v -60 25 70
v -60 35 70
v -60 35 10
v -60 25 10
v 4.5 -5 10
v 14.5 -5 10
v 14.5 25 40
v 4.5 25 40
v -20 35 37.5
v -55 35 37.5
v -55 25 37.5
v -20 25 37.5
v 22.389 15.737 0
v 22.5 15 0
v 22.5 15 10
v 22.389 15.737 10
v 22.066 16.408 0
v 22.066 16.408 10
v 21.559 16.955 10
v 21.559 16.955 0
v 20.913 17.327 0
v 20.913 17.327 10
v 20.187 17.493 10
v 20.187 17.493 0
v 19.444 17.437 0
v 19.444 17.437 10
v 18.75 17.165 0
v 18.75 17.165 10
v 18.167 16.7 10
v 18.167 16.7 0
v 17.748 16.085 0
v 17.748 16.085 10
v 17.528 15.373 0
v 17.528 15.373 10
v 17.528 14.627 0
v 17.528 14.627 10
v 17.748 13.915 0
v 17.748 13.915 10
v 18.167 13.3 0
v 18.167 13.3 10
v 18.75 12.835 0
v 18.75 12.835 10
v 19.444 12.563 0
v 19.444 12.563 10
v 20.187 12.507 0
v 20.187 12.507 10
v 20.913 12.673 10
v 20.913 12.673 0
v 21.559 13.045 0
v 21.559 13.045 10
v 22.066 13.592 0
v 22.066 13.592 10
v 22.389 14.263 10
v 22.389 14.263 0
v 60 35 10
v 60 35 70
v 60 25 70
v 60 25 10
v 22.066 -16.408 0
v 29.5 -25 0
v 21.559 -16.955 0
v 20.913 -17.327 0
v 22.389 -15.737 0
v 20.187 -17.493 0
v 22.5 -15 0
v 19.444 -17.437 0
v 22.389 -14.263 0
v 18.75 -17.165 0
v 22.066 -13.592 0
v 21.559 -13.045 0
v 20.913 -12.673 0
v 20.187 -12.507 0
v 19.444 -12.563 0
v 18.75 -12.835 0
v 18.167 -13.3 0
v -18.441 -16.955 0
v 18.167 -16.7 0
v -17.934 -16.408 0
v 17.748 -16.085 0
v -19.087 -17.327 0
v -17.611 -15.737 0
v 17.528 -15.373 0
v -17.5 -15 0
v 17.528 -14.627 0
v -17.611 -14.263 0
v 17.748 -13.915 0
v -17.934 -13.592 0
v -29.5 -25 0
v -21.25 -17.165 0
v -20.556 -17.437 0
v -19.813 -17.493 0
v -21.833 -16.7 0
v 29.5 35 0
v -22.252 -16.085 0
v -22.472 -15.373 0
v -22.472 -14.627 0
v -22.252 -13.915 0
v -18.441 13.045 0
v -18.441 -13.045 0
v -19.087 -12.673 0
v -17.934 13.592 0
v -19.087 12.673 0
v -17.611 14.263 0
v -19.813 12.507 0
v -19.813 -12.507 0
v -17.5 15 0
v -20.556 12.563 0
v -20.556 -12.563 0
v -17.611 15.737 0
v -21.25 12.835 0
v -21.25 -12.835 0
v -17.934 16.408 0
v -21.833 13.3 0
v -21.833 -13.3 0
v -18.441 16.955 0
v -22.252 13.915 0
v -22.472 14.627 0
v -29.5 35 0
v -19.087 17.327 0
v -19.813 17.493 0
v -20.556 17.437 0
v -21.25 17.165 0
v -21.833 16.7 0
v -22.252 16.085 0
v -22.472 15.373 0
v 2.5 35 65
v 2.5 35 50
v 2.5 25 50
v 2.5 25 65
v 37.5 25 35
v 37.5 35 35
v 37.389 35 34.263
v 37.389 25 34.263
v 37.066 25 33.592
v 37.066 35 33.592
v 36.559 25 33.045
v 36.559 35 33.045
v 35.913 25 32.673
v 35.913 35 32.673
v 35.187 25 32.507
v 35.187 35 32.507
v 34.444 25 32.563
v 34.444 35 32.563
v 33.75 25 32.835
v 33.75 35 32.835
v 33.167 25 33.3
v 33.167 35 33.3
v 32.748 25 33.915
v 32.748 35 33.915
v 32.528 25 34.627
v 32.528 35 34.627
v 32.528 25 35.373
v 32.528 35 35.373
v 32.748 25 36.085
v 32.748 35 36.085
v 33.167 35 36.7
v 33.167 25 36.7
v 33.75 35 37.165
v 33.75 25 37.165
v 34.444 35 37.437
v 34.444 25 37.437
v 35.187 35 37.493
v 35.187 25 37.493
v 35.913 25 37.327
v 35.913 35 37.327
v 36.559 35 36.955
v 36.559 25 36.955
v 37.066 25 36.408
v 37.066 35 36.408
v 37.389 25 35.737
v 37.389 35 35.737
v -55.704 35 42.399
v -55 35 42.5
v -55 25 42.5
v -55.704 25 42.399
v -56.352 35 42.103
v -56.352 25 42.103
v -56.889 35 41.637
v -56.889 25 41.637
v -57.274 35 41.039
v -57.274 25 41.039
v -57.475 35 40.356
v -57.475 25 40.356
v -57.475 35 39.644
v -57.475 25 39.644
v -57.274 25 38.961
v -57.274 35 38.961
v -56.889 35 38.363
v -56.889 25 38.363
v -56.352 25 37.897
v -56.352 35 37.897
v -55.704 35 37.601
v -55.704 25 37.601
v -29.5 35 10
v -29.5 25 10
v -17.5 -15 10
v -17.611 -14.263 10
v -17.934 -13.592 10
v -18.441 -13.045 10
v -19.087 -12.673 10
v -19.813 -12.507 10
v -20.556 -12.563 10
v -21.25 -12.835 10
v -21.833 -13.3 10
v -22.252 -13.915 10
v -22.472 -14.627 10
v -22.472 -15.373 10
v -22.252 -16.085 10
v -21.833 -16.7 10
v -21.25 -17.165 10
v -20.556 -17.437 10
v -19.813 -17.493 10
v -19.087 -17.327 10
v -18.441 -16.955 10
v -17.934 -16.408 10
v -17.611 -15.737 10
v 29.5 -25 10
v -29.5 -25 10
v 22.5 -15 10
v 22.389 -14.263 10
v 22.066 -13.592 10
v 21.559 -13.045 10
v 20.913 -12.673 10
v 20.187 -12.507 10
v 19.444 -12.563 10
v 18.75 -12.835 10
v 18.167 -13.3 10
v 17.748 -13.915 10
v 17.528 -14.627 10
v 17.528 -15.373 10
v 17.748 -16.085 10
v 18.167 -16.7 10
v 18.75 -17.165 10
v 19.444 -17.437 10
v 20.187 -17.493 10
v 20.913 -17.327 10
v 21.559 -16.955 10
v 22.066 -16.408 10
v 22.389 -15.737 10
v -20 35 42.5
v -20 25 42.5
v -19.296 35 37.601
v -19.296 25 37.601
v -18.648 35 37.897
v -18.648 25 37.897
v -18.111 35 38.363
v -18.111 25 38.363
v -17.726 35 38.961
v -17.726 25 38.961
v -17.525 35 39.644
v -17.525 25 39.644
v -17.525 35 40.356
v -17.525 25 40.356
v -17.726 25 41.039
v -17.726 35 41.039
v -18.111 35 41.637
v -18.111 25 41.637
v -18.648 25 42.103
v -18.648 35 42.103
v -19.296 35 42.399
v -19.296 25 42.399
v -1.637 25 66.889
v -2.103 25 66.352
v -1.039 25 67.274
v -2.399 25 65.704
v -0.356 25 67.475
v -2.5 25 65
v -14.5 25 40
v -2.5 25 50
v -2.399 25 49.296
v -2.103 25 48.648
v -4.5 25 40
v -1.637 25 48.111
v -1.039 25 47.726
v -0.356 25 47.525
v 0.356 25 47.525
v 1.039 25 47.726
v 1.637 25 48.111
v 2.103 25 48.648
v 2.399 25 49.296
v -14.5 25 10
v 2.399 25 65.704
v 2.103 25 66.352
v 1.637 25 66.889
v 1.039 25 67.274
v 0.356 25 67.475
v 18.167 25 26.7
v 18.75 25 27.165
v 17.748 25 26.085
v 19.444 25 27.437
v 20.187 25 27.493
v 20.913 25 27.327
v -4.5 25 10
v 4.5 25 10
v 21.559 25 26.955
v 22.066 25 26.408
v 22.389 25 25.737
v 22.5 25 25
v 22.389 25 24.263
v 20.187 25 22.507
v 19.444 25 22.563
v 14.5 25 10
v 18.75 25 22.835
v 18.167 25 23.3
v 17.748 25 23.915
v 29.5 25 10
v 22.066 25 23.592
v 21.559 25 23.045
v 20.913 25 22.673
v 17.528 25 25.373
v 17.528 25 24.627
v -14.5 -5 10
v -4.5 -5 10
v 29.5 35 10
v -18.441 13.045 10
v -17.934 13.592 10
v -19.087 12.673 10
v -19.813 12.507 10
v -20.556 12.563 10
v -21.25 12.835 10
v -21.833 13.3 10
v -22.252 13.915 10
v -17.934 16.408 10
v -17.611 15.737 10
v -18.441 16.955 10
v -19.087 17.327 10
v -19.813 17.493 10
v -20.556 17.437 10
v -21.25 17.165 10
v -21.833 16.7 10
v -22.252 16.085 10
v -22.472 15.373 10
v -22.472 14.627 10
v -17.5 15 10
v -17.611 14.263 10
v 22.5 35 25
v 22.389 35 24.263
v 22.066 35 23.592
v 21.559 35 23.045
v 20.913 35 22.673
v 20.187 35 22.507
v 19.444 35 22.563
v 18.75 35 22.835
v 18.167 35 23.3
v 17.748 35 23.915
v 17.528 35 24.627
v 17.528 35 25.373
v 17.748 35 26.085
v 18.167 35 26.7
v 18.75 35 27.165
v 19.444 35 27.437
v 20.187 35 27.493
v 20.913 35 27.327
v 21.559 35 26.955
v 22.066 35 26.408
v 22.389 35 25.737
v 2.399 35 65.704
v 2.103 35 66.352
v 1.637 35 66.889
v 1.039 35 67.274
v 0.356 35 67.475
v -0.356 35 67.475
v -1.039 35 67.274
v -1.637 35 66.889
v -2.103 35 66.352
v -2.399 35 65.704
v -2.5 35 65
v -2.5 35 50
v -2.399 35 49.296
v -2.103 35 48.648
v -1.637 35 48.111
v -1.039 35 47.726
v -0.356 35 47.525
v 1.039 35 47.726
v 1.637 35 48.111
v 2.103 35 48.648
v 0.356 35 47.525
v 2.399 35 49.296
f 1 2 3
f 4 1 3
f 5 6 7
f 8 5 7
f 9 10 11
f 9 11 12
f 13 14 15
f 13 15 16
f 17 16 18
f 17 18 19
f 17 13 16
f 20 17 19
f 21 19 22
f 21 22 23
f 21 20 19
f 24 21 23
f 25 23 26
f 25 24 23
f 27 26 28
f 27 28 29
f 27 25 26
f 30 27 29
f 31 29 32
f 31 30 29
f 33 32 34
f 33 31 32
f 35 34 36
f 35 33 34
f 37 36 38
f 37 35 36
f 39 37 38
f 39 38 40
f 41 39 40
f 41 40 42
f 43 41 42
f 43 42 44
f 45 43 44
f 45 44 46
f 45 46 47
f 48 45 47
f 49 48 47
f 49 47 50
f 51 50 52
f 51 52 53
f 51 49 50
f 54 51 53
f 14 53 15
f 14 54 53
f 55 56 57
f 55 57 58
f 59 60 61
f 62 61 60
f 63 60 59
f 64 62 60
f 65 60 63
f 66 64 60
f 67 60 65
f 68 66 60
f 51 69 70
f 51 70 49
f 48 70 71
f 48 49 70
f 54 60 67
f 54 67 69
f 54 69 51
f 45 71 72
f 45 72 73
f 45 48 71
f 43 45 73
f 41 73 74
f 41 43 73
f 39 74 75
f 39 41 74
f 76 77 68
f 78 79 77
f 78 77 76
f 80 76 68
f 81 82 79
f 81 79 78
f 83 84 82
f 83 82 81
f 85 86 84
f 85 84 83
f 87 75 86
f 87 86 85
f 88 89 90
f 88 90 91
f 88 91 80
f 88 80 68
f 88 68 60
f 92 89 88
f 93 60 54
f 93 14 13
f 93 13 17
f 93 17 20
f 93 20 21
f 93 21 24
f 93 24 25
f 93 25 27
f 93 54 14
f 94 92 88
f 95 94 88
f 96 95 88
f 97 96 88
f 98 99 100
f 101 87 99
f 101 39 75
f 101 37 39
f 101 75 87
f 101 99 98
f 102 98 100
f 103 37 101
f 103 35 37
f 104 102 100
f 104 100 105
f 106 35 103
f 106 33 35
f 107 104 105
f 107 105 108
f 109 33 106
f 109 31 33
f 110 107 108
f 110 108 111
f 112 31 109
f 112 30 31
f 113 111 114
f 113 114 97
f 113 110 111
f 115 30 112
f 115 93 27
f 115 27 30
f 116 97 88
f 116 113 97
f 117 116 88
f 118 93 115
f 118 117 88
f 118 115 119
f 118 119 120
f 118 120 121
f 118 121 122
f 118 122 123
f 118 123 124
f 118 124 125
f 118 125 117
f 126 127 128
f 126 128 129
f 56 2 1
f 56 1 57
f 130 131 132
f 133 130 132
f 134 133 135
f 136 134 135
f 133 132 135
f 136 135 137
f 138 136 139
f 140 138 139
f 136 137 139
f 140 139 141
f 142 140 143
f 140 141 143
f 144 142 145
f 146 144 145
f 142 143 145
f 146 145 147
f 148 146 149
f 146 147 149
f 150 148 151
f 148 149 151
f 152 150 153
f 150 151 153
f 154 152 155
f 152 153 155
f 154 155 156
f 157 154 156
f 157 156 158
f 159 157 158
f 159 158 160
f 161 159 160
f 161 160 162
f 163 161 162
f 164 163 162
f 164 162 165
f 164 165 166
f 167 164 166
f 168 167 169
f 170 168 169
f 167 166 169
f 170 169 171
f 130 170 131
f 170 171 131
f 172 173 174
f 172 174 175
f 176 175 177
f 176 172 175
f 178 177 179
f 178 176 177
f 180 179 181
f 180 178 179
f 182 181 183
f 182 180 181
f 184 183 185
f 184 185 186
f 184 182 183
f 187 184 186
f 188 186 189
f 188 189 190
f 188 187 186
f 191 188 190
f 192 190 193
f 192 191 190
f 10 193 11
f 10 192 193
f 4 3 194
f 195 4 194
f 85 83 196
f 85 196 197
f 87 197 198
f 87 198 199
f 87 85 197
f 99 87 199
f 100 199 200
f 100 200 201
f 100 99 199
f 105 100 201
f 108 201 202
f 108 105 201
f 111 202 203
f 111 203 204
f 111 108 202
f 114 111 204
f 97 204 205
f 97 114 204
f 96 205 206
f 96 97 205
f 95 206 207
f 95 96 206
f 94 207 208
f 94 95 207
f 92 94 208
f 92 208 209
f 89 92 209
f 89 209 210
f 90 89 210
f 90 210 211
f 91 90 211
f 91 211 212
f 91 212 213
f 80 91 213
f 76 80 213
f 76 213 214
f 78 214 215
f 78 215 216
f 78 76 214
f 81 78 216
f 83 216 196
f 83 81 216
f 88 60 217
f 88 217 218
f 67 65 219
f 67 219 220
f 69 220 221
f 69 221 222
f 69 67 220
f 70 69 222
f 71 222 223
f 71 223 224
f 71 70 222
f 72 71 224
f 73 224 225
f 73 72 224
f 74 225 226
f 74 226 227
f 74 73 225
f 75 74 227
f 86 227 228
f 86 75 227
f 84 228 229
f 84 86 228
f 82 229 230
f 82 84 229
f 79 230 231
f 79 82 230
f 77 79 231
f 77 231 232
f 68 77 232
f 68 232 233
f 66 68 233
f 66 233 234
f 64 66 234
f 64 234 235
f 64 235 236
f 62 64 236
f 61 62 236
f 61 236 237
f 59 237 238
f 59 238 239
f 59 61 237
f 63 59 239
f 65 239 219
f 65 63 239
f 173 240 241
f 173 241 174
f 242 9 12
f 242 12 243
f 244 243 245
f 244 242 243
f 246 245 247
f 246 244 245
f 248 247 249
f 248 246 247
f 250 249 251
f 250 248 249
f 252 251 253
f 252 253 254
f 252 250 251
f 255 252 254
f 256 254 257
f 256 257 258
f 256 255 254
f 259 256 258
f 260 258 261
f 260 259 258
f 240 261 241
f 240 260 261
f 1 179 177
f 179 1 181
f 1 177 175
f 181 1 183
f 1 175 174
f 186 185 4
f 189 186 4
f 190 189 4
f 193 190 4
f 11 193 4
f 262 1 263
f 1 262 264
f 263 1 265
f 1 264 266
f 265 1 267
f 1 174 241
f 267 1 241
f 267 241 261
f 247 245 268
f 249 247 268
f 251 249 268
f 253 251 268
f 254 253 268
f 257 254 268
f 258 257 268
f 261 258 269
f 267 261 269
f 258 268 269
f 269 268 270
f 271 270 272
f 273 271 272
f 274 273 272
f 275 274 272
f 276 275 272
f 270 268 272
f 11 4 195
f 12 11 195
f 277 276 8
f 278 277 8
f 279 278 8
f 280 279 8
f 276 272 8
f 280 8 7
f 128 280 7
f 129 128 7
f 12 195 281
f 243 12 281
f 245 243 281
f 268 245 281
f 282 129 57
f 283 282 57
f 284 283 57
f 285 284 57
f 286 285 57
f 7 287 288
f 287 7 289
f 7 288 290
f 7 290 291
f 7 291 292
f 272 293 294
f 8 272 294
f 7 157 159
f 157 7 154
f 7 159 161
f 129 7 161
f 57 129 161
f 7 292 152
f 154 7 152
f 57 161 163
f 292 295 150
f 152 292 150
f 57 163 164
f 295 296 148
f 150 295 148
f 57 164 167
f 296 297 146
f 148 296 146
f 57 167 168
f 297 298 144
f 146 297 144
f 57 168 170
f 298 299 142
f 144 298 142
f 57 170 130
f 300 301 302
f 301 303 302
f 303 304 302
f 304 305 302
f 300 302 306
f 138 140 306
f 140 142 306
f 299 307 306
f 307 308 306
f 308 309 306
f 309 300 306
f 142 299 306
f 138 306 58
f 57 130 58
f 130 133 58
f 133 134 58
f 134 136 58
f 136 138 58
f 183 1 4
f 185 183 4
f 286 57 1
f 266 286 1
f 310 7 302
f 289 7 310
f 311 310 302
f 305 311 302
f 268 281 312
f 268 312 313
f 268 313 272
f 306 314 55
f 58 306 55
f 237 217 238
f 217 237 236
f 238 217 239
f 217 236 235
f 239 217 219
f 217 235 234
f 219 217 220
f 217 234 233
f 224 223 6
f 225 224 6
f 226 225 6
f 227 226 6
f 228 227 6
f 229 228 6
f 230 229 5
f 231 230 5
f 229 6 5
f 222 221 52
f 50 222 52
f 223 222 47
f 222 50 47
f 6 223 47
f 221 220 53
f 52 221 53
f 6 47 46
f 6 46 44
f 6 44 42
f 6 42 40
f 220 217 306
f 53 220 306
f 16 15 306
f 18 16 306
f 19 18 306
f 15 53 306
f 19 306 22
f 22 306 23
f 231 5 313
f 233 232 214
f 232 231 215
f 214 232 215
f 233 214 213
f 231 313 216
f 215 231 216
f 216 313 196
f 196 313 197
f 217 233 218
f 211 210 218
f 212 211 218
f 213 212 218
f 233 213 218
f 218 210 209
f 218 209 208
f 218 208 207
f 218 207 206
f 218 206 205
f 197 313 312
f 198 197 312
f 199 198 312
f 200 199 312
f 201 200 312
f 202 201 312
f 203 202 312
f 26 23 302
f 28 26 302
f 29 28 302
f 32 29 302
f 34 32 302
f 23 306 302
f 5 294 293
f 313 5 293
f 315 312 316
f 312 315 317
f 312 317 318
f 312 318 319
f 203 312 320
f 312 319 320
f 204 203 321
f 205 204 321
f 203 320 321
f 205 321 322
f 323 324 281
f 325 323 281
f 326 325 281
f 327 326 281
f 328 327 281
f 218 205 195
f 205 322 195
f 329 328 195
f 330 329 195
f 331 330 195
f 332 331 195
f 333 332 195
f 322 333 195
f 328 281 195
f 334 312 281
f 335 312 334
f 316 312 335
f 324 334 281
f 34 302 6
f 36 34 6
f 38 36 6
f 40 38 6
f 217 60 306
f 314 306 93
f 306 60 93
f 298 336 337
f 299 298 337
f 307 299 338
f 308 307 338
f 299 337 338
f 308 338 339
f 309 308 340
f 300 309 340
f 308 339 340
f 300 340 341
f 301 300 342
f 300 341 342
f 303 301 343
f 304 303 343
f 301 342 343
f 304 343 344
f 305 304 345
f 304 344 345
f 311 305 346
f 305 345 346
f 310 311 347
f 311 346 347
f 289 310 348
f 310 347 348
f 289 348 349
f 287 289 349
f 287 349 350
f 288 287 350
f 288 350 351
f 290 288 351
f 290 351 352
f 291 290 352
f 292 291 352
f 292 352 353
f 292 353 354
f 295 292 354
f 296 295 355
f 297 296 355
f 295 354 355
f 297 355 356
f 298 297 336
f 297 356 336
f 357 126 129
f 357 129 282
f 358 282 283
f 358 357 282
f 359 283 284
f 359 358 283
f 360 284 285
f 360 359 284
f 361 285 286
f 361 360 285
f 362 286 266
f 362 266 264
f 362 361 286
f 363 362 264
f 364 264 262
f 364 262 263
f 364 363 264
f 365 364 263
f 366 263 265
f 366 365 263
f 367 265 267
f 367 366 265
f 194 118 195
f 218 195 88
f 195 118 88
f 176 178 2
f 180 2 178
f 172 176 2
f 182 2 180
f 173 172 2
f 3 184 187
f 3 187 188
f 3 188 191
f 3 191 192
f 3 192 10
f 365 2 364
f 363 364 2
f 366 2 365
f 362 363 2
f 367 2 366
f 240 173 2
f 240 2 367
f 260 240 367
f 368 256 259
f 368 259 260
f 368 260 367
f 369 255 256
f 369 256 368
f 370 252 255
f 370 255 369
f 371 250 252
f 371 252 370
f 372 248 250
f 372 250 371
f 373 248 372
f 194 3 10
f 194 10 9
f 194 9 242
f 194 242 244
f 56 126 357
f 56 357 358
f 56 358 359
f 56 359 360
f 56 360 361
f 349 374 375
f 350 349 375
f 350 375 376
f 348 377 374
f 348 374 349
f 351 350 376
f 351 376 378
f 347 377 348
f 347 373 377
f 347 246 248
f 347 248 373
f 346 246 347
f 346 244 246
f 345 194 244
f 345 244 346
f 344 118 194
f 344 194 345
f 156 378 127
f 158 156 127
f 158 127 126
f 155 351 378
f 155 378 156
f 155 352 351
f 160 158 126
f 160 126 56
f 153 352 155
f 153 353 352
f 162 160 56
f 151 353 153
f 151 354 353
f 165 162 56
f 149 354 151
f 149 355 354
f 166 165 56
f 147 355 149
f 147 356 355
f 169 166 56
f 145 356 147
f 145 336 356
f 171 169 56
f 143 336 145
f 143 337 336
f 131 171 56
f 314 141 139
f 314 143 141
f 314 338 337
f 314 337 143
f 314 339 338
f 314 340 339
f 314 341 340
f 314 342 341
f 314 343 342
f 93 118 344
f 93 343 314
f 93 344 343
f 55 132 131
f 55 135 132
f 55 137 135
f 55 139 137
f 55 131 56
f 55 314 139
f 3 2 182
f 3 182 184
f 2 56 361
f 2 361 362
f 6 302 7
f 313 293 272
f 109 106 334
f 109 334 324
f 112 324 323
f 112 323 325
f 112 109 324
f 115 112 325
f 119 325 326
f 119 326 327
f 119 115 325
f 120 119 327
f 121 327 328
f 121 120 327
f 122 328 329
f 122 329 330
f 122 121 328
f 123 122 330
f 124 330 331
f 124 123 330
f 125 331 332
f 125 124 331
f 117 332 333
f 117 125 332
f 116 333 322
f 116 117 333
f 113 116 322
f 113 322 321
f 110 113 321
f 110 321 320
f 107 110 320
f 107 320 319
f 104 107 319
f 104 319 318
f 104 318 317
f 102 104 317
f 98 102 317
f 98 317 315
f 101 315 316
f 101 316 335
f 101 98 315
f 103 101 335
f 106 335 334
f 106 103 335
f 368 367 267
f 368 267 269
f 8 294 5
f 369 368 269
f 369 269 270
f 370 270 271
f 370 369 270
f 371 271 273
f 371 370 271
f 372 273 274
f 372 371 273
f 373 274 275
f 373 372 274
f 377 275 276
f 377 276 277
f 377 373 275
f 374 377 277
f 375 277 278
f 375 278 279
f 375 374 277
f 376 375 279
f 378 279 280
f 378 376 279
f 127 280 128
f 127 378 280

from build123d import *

# Parameters (mm, degrees)
SKETCH1_R           = 2.5
BOSS_EXTRUDE1_DEPTH = 10
SKETCH2_W           = 120
SKETCH2_H           = 60
SKETCH2_R           = 2.5
BOSS_EXTRUDE2_DEPTH = 10
BOSS_EXTRUDE3_DEPTH = 10


with BuildPart() as part:
    # Sketch1 → Boss-Extrude1 (new body)
    with BuildSketch(Plane.XY):
        Polygon((-29.5, 25), (-29.5, 35), (29.5, 35), (29.5, 25), (29.5, -25), (-29.5, -25), align=None)
        with Locations((-20, 15)):
            Circle(SKETCH1_R, mode=Mode.SUBTRACT)
        with Locations((20, 15)):
            Circle(SKETCH1_R, mode=Mode.SUBTRACT)
        with Locations((20, -15)):
            Circle(SKETCH1_R, mode=Mode.SUBTRACT)
        with Locations((-20, -15)):
            Circle(SKETCH1_R, mode=Mode.SUBTRACT)
    extrude(amount=BOSS_EXTRUDE1_DEPTH)

    # Sketch2 → Boss-Extrude2 (add)
    with BuildSketch(Plane(origin=(0, 35, 0), x_dir=(1, 0, 0), z_dir=(0, 1, 0))):
        with Locations((0, -40)):
            Rectangle(SKETCH2_W, SKETCH2_H)
        with Locations((20, -25)):
            Circle(SKETCH2_R, mode=Mode.SUBTRACT)
        with Locations((35, -35)):
            Circle(SKETCH2_R, mode=Mode.SUBTRACT)
        with BuildLine():
            Line((-55, -37.5), (-20, -37.5))
            ThreePointArc((-20, -37.5), (-17.5, -40), (-20, -42.5))
            Line((-20, -42.5), (-55, -42.5))
            ThreePointArc((-55, -42.5), (-57.5, -40), (-55, -37.5))
        make_face(mode=Mode.SUBTRACT)
        with BuildLine():
            Line((-2.5, -65), (-2.5, -50))
            ThreePointArc((-2.5, -50), (0, -47.5), (2.5, -50))
            Line((2.5, -50), (2.5, -65))
            ThreePointArc((2.5, -65), (0, -67.5), (-2.5, -65))
        make_face(mode=Mode.SUBTRACT)
    extrude(amount=-BOSS_EXTRUDE2_DEPTH)

    # Sketch4 → Boss-Extrude3 (add)
    with BuildSketch(Plane(origin=(14.5, 0, 0), x_dir=(0, 0, -1), z_dir=(1, 0, 0))):
        Polygon((-40, 25), (-10, 25), (-10, -5), align=None)
    boss_extrude3 = extrude(amount=-BOSS_EXTRUDE3_DEPTH)

    # Mirror1: Boss-Extrude3 across plane
    add(boss_extrude3.mirror(Plane(origin=(0, 0, 0), x_dir=(0, 0, 1), z_dir=(1, 0, 0))))


solid = part.part
